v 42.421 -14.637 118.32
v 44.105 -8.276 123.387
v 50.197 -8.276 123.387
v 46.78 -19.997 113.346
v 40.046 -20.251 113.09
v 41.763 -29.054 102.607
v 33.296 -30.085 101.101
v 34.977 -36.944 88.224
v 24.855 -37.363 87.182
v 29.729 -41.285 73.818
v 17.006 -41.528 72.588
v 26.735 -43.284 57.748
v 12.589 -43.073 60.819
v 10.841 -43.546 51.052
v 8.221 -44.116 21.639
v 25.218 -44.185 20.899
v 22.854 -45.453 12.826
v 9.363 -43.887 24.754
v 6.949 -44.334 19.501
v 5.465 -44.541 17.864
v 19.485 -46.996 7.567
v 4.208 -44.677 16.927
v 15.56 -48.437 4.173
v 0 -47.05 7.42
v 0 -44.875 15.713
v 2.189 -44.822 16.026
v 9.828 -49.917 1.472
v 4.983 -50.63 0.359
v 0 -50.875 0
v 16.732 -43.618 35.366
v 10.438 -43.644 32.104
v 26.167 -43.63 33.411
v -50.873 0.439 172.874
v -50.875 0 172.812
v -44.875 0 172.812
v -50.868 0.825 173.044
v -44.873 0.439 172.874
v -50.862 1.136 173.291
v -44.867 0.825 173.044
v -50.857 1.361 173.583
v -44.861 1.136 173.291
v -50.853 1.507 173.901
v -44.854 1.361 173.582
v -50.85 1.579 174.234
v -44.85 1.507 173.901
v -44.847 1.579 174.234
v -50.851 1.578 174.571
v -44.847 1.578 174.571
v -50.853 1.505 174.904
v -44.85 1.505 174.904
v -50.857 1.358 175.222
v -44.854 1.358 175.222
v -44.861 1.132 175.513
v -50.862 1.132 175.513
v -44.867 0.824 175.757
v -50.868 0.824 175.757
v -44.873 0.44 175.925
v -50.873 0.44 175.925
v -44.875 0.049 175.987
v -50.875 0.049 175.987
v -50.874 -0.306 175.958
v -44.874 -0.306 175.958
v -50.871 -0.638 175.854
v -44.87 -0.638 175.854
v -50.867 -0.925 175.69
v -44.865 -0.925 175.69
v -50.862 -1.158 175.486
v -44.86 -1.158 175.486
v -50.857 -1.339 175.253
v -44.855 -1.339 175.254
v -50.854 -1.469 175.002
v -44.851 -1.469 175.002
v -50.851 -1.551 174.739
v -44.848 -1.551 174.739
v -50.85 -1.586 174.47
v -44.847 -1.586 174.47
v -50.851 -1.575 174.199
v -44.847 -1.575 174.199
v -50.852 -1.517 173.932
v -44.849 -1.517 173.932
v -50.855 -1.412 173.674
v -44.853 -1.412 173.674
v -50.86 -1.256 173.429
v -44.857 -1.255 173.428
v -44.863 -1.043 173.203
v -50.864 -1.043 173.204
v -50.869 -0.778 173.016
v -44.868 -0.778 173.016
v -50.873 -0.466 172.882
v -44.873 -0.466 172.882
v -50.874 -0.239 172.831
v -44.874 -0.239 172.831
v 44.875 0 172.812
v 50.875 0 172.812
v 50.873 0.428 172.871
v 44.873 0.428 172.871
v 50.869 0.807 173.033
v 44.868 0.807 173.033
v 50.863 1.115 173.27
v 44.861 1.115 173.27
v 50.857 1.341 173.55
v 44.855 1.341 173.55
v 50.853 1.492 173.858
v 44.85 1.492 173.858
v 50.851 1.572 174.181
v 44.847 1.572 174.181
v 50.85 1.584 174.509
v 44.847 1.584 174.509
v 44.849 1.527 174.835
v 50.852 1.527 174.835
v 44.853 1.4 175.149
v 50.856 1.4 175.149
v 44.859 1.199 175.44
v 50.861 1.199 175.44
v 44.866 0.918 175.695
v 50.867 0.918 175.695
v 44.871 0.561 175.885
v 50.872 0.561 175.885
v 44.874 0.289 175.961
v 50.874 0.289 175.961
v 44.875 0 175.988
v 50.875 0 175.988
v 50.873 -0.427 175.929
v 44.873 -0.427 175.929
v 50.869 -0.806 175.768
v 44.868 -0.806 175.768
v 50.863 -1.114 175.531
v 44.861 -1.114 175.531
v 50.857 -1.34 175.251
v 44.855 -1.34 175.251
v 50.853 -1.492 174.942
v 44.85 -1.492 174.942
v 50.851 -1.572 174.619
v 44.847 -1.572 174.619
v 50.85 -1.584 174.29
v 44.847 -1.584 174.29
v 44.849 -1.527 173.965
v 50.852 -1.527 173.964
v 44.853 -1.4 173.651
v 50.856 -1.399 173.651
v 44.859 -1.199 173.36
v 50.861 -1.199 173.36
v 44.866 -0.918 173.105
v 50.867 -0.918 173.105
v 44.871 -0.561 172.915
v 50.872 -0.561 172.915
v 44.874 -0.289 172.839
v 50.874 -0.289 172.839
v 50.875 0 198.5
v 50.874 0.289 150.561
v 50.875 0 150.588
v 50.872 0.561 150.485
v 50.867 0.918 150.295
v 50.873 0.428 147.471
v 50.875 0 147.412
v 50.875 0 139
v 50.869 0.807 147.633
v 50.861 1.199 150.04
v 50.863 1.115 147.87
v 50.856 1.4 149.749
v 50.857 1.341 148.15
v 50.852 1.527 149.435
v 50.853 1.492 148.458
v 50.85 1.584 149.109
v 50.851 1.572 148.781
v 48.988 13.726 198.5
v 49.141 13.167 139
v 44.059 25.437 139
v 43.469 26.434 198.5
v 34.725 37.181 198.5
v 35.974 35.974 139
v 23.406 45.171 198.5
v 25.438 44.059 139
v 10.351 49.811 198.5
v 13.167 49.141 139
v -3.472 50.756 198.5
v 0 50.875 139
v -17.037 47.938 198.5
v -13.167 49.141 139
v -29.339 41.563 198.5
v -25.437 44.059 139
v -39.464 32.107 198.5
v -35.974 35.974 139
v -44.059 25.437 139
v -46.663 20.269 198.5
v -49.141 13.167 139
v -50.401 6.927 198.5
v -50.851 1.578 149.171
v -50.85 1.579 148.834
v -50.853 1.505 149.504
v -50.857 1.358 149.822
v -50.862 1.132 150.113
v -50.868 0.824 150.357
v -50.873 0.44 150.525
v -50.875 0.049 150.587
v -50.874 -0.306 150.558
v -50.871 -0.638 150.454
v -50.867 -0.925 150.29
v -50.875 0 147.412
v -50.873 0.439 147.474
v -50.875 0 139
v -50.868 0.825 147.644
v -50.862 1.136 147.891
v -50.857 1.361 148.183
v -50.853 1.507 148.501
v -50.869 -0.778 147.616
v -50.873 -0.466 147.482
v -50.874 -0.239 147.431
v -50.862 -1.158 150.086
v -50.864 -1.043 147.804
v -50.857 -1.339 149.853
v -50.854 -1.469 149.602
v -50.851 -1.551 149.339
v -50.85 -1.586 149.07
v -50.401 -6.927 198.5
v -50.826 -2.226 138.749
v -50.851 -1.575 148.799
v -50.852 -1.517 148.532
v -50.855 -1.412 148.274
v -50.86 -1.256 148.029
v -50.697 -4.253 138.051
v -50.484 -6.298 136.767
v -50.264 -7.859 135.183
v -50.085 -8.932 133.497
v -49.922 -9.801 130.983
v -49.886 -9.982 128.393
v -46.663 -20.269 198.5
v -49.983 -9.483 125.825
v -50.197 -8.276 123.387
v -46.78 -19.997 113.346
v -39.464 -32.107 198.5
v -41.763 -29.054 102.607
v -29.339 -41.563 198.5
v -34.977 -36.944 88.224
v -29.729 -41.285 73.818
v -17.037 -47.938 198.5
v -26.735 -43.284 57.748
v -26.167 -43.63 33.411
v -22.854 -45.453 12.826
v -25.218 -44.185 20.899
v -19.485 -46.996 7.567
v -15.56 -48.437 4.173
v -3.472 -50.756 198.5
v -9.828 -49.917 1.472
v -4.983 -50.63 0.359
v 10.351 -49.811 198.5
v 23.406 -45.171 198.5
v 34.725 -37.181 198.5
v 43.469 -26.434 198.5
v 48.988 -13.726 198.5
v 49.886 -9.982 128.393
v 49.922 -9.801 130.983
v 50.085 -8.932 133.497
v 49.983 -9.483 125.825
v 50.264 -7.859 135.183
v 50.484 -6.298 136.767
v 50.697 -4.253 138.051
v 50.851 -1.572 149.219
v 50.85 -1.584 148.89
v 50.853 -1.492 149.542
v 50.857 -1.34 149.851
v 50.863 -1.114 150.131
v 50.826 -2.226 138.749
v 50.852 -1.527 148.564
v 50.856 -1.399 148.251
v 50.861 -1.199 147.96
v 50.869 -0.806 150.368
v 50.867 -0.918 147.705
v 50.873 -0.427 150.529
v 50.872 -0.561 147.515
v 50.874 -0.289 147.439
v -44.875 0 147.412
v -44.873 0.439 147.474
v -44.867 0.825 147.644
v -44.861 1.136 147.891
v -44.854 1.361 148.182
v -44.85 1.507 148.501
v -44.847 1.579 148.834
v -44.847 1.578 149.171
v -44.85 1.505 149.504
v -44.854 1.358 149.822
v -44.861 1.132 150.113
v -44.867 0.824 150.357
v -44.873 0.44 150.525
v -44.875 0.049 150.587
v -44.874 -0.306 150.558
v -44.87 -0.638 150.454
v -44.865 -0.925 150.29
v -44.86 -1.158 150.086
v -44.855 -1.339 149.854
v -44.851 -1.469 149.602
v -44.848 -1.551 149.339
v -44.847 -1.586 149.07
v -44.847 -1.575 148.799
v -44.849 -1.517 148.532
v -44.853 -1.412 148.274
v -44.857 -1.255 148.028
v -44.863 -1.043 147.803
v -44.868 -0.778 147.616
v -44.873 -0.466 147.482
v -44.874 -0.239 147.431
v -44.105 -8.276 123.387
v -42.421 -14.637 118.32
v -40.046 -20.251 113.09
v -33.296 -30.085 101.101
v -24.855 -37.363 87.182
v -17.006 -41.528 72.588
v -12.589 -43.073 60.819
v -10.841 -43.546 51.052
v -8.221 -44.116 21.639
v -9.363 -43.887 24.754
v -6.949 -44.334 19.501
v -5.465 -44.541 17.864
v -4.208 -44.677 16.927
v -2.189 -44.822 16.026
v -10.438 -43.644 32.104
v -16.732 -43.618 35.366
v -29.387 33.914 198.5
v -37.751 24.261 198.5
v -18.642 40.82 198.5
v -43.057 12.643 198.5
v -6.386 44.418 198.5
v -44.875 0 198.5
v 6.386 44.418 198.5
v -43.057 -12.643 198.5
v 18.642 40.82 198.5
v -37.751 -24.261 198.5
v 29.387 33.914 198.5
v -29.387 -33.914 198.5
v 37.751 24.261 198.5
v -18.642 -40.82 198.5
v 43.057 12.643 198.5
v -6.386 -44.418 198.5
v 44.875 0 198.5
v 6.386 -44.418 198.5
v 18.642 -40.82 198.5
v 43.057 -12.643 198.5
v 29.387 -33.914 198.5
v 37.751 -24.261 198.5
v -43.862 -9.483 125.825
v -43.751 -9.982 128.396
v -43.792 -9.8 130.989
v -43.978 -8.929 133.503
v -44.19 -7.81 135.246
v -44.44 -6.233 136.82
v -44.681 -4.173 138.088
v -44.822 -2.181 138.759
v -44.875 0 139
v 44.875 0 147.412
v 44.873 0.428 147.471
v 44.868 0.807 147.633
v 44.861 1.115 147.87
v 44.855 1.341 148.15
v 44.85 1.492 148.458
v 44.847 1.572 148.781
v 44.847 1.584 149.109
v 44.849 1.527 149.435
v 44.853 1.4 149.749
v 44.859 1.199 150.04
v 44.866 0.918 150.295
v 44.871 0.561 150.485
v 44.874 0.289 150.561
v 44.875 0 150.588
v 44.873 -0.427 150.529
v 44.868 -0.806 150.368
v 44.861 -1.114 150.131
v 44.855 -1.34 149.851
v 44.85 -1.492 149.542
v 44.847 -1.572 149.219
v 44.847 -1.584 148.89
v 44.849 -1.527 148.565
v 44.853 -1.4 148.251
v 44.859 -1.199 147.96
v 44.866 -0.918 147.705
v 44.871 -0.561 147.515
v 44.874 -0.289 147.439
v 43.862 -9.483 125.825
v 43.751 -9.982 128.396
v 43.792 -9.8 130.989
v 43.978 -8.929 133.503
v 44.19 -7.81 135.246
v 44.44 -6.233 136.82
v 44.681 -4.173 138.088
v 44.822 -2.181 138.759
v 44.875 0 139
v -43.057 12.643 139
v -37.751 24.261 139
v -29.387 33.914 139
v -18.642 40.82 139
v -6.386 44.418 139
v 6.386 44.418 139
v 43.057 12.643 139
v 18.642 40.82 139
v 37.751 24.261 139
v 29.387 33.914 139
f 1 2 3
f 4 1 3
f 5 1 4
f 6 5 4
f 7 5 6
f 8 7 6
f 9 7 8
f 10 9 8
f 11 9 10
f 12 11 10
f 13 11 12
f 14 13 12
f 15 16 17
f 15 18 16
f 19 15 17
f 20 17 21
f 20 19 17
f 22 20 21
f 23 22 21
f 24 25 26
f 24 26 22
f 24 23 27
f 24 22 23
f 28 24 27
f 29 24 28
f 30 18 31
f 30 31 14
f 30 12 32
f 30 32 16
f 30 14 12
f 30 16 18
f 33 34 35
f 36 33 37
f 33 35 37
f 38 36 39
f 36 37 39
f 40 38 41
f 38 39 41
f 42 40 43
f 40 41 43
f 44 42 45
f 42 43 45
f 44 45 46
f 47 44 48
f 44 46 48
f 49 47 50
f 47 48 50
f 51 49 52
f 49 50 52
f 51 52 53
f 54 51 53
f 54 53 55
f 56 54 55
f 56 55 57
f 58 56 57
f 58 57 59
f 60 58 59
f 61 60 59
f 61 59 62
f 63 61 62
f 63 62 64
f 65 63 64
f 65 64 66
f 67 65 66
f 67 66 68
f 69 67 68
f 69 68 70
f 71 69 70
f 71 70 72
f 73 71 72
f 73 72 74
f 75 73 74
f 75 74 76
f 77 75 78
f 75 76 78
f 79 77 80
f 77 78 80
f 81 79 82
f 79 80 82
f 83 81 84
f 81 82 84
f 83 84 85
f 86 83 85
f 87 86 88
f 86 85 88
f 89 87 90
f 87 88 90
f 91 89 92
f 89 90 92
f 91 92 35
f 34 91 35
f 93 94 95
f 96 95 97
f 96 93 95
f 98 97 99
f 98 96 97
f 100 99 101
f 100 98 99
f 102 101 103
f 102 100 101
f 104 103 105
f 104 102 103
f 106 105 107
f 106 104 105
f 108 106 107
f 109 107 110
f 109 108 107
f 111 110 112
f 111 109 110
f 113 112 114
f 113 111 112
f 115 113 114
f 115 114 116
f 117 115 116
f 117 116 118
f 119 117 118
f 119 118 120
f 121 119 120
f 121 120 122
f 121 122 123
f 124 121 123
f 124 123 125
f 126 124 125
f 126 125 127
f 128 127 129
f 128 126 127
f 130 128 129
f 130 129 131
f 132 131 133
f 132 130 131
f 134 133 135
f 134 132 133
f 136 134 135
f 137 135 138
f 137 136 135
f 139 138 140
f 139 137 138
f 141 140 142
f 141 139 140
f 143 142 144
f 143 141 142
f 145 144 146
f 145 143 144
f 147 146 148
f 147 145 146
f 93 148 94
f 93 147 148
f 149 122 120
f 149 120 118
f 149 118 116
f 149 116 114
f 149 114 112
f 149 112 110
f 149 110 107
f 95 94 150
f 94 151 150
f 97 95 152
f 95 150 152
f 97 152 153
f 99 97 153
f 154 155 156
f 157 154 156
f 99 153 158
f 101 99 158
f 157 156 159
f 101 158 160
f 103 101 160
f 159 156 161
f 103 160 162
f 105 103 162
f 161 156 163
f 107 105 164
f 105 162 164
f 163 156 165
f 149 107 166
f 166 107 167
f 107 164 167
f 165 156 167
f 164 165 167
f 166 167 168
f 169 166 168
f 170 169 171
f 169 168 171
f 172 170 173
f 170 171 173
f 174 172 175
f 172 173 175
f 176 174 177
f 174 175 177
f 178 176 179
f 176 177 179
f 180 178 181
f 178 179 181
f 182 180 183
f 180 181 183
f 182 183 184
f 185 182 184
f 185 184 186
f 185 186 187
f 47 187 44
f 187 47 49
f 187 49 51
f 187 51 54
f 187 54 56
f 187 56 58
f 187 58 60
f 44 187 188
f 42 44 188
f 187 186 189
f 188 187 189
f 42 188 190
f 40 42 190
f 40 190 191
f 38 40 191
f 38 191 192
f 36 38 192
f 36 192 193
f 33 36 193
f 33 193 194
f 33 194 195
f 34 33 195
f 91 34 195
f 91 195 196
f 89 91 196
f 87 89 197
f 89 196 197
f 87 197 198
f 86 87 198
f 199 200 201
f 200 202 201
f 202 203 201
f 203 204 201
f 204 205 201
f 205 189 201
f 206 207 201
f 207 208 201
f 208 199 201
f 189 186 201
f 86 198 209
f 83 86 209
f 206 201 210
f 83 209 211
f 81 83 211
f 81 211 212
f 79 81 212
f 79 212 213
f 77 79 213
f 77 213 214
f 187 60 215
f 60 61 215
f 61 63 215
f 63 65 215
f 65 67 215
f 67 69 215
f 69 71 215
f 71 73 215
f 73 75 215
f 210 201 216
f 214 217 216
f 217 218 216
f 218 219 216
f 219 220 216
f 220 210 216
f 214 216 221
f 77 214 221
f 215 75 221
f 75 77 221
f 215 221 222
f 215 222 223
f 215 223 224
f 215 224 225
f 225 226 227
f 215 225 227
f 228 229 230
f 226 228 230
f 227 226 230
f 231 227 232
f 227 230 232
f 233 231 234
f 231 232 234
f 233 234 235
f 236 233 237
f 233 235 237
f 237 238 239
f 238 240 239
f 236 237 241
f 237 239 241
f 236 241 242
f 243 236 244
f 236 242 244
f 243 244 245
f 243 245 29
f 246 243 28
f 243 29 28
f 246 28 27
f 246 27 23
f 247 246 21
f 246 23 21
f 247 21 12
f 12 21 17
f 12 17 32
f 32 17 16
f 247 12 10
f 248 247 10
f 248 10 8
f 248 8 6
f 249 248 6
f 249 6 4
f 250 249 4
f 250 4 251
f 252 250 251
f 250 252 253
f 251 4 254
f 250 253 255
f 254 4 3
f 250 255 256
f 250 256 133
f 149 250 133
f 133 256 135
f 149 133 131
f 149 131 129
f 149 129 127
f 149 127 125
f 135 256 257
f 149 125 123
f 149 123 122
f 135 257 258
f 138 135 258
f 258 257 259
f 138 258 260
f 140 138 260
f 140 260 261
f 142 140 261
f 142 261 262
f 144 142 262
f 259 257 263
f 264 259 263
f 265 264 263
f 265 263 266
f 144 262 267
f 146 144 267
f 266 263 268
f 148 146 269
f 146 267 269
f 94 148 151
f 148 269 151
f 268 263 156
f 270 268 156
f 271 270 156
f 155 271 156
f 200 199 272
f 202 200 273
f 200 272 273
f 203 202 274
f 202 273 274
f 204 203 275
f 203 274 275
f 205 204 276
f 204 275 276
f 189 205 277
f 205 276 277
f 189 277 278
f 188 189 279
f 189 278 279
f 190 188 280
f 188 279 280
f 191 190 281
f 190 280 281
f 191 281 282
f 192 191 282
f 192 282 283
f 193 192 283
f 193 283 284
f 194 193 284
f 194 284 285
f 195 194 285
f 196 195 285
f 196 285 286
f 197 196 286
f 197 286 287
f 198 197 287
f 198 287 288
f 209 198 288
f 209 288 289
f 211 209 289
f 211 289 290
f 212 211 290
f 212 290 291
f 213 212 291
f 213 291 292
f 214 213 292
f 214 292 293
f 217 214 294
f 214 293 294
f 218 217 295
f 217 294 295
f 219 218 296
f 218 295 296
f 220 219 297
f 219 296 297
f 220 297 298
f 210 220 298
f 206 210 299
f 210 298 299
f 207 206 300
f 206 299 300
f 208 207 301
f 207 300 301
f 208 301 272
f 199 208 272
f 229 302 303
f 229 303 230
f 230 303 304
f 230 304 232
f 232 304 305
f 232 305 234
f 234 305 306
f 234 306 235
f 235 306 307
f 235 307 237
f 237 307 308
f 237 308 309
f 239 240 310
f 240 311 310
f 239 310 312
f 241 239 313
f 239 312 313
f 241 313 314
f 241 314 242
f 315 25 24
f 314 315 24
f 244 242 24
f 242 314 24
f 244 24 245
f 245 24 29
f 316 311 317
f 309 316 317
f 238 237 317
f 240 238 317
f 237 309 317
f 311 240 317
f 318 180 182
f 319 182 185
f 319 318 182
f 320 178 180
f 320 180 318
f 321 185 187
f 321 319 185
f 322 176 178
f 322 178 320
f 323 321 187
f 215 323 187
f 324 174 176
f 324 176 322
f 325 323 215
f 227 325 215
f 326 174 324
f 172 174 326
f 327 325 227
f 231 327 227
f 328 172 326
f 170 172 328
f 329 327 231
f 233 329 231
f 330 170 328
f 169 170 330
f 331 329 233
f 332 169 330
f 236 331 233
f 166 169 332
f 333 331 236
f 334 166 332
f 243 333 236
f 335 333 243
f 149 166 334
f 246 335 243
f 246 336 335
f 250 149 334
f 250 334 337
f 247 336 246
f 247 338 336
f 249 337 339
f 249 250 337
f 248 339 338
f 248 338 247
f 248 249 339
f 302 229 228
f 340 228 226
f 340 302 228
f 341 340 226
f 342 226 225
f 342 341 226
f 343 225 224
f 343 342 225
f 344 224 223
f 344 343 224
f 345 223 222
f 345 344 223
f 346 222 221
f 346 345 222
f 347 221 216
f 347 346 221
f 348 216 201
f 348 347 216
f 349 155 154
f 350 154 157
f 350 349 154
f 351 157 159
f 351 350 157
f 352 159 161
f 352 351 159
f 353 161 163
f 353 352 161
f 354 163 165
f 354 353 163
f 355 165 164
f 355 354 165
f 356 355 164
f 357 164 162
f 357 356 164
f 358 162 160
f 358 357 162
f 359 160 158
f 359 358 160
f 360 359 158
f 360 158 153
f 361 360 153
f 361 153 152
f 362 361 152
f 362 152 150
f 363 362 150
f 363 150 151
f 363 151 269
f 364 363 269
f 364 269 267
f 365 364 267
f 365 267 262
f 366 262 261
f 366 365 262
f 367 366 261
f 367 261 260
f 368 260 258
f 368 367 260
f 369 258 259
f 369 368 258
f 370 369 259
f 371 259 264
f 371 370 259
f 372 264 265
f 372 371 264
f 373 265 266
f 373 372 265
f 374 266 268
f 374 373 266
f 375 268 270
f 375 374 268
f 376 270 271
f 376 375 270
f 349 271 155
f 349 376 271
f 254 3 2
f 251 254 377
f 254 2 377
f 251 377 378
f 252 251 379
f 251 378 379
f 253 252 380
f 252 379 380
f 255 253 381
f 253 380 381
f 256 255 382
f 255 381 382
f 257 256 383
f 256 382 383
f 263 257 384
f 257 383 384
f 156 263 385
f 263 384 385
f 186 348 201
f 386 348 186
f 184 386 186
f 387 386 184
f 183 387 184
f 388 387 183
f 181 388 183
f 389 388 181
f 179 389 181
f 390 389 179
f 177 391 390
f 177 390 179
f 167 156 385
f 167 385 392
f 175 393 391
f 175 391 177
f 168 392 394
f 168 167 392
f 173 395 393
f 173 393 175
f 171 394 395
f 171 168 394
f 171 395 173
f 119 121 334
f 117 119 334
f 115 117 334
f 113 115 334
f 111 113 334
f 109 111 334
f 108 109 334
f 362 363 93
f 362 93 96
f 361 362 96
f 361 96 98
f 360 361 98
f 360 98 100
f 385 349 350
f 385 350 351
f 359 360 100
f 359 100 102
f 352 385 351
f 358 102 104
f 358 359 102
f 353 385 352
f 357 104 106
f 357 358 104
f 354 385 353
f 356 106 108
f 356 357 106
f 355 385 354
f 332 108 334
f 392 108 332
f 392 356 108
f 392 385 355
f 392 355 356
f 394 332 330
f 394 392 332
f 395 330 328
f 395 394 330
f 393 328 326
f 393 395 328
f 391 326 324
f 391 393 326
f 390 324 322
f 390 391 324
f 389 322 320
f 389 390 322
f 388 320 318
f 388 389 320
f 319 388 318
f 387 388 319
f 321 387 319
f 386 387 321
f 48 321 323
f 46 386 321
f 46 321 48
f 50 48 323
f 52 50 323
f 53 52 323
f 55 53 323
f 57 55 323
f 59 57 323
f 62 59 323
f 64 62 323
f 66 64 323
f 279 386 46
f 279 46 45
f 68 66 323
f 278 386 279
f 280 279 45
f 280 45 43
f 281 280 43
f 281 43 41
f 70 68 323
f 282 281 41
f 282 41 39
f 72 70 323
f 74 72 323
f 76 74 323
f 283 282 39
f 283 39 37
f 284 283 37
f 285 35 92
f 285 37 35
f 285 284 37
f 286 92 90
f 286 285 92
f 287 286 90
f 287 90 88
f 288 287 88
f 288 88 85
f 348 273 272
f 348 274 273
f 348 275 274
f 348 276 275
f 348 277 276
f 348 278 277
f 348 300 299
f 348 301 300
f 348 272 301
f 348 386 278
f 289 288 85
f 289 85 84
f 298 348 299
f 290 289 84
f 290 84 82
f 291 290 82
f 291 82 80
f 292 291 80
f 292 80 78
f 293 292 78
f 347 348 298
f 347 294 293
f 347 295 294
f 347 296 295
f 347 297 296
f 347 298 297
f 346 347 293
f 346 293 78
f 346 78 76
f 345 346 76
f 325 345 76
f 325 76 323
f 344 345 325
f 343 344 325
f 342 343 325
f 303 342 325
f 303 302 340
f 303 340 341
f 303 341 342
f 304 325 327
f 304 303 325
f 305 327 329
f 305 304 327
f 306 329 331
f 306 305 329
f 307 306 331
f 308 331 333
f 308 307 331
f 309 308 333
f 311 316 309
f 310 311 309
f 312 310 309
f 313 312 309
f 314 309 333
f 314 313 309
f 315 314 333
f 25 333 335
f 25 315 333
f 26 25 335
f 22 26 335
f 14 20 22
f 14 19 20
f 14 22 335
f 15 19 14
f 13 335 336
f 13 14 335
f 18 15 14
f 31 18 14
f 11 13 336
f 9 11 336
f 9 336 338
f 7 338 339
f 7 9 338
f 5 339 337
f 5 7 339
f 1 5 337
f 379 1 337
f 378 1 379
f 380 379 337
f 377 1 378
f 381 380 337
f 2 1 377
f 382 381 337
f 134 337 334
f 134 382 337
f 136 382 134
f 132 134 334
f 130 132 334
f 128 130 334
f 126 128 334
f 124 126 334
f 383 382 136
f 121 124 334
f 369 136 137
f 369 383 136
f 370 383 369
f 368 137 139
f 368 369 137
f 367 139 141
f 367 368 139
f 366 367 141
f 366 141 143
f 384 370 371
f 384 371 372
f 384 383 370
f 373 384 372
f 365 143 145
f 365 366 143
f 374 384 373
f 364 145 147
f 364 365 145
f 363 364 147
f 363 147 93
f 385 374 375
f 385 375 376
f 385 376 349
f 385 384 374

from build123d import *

# Parameters (mm, degrees)
SKETCH1_R               = 50.875
SKETCH1_R_2             = 44.875
BOSS_EXTRUDE1_DEPTH     = 258
SKETCH2_OUTSIDE_W       = 319.084
SKETCH2_OUTSIDE_H       = 162.834
CUT_EXTRUDE1_DEPTH      = 51.875
CUT_EXTRUDE1_DEPTH_BACK = 51.875
SKETCH4_R               = 1.5875
CUT_EXTRUDE3_DEPTH      = 51.8750001
CUT_EXTRUDE3_DEPTH_BACK = 51.8750001


with BuildPart() as part:
    # Sketch1 → Boss-Extrude1 (new body)
    with BuildSketch(Plane.XY):
        Circle(SKETCH1_R)
        Circle(SKETCH1_R_2, mode=Mode.SUBTRACT)
    extrude(amount=BOSS_EXTRUDE1_DEPTH)

    # Sketch2 outside → Cut-Extrude1 (cut, two sides)
    with BuildSketch(Plane(origin=(0, 0, 0), x_dir=(0, 0, -1), z_dir=(1, 0, 0))) as cut_extrude1_sk:
        with Locations((-129, 0)):
            Rectangle(SKETCH2_OUTSIDE_W, SKETCH2_OUTSIDE_H)
        with BuildLine():
            Line((-198.5, -50.875), (0, -50.875))
            add(Edge.make_bspline(
                [(-123.386550588, -8.275819337), (-81.752620628, -64.643145872), (-28.413904024, -31.213109934), (0, -50.875)],
                knots=[0.043569277, 0.043569277, 0.043569277, 0.043569277, 1, 1, 1, 1], degree=3))
            ThreePointArc((-123.386550588, -8.275819337), (-133.683241713, -8.835567161), (-139, 0))
            Line((-139, 0), (-139, 50.875))
            Line((-139, 50.875), (-198.5, 50.875))
            Line((-198.5, 50.875), (-198.5, -50.875))
        make_face(mode=Mode.SUBTRACT)
    extrude(amount=CUT_EXTRUDE1_DEPTH, mode=Mode.SUBTRACT)
    extrude(cut_extrude1_sk.sketch, amount=-CUT_EXTRUDE1_DEPTH_BACK, mode=Mode.SUBTRACT)

    # Sketch4 → Cut-Extrude3 (cut, two sides)
    with BuildSketch(Plane(origin=(0, 0, 0), x_dir=(0, 0, -1), z_dir=(1, 0, 0))) as cut_extrude3_sk:
        with Locations((-149, 0)):
            Circle(SKETCH4_R)
        with Locations((-174.4, 0)):
            Circle(SKETCH4_R)
    extrude(amount=CUT_EXTRUDE3_DEPTH, mode=Mode.SUBTRACT)
    extrude(cut_extrude3_sk.sketch, amount=-CUT_EXTRUDE3_DEPTH_BACK, mode=Mode.SUBTRACT)


solid = part.part
